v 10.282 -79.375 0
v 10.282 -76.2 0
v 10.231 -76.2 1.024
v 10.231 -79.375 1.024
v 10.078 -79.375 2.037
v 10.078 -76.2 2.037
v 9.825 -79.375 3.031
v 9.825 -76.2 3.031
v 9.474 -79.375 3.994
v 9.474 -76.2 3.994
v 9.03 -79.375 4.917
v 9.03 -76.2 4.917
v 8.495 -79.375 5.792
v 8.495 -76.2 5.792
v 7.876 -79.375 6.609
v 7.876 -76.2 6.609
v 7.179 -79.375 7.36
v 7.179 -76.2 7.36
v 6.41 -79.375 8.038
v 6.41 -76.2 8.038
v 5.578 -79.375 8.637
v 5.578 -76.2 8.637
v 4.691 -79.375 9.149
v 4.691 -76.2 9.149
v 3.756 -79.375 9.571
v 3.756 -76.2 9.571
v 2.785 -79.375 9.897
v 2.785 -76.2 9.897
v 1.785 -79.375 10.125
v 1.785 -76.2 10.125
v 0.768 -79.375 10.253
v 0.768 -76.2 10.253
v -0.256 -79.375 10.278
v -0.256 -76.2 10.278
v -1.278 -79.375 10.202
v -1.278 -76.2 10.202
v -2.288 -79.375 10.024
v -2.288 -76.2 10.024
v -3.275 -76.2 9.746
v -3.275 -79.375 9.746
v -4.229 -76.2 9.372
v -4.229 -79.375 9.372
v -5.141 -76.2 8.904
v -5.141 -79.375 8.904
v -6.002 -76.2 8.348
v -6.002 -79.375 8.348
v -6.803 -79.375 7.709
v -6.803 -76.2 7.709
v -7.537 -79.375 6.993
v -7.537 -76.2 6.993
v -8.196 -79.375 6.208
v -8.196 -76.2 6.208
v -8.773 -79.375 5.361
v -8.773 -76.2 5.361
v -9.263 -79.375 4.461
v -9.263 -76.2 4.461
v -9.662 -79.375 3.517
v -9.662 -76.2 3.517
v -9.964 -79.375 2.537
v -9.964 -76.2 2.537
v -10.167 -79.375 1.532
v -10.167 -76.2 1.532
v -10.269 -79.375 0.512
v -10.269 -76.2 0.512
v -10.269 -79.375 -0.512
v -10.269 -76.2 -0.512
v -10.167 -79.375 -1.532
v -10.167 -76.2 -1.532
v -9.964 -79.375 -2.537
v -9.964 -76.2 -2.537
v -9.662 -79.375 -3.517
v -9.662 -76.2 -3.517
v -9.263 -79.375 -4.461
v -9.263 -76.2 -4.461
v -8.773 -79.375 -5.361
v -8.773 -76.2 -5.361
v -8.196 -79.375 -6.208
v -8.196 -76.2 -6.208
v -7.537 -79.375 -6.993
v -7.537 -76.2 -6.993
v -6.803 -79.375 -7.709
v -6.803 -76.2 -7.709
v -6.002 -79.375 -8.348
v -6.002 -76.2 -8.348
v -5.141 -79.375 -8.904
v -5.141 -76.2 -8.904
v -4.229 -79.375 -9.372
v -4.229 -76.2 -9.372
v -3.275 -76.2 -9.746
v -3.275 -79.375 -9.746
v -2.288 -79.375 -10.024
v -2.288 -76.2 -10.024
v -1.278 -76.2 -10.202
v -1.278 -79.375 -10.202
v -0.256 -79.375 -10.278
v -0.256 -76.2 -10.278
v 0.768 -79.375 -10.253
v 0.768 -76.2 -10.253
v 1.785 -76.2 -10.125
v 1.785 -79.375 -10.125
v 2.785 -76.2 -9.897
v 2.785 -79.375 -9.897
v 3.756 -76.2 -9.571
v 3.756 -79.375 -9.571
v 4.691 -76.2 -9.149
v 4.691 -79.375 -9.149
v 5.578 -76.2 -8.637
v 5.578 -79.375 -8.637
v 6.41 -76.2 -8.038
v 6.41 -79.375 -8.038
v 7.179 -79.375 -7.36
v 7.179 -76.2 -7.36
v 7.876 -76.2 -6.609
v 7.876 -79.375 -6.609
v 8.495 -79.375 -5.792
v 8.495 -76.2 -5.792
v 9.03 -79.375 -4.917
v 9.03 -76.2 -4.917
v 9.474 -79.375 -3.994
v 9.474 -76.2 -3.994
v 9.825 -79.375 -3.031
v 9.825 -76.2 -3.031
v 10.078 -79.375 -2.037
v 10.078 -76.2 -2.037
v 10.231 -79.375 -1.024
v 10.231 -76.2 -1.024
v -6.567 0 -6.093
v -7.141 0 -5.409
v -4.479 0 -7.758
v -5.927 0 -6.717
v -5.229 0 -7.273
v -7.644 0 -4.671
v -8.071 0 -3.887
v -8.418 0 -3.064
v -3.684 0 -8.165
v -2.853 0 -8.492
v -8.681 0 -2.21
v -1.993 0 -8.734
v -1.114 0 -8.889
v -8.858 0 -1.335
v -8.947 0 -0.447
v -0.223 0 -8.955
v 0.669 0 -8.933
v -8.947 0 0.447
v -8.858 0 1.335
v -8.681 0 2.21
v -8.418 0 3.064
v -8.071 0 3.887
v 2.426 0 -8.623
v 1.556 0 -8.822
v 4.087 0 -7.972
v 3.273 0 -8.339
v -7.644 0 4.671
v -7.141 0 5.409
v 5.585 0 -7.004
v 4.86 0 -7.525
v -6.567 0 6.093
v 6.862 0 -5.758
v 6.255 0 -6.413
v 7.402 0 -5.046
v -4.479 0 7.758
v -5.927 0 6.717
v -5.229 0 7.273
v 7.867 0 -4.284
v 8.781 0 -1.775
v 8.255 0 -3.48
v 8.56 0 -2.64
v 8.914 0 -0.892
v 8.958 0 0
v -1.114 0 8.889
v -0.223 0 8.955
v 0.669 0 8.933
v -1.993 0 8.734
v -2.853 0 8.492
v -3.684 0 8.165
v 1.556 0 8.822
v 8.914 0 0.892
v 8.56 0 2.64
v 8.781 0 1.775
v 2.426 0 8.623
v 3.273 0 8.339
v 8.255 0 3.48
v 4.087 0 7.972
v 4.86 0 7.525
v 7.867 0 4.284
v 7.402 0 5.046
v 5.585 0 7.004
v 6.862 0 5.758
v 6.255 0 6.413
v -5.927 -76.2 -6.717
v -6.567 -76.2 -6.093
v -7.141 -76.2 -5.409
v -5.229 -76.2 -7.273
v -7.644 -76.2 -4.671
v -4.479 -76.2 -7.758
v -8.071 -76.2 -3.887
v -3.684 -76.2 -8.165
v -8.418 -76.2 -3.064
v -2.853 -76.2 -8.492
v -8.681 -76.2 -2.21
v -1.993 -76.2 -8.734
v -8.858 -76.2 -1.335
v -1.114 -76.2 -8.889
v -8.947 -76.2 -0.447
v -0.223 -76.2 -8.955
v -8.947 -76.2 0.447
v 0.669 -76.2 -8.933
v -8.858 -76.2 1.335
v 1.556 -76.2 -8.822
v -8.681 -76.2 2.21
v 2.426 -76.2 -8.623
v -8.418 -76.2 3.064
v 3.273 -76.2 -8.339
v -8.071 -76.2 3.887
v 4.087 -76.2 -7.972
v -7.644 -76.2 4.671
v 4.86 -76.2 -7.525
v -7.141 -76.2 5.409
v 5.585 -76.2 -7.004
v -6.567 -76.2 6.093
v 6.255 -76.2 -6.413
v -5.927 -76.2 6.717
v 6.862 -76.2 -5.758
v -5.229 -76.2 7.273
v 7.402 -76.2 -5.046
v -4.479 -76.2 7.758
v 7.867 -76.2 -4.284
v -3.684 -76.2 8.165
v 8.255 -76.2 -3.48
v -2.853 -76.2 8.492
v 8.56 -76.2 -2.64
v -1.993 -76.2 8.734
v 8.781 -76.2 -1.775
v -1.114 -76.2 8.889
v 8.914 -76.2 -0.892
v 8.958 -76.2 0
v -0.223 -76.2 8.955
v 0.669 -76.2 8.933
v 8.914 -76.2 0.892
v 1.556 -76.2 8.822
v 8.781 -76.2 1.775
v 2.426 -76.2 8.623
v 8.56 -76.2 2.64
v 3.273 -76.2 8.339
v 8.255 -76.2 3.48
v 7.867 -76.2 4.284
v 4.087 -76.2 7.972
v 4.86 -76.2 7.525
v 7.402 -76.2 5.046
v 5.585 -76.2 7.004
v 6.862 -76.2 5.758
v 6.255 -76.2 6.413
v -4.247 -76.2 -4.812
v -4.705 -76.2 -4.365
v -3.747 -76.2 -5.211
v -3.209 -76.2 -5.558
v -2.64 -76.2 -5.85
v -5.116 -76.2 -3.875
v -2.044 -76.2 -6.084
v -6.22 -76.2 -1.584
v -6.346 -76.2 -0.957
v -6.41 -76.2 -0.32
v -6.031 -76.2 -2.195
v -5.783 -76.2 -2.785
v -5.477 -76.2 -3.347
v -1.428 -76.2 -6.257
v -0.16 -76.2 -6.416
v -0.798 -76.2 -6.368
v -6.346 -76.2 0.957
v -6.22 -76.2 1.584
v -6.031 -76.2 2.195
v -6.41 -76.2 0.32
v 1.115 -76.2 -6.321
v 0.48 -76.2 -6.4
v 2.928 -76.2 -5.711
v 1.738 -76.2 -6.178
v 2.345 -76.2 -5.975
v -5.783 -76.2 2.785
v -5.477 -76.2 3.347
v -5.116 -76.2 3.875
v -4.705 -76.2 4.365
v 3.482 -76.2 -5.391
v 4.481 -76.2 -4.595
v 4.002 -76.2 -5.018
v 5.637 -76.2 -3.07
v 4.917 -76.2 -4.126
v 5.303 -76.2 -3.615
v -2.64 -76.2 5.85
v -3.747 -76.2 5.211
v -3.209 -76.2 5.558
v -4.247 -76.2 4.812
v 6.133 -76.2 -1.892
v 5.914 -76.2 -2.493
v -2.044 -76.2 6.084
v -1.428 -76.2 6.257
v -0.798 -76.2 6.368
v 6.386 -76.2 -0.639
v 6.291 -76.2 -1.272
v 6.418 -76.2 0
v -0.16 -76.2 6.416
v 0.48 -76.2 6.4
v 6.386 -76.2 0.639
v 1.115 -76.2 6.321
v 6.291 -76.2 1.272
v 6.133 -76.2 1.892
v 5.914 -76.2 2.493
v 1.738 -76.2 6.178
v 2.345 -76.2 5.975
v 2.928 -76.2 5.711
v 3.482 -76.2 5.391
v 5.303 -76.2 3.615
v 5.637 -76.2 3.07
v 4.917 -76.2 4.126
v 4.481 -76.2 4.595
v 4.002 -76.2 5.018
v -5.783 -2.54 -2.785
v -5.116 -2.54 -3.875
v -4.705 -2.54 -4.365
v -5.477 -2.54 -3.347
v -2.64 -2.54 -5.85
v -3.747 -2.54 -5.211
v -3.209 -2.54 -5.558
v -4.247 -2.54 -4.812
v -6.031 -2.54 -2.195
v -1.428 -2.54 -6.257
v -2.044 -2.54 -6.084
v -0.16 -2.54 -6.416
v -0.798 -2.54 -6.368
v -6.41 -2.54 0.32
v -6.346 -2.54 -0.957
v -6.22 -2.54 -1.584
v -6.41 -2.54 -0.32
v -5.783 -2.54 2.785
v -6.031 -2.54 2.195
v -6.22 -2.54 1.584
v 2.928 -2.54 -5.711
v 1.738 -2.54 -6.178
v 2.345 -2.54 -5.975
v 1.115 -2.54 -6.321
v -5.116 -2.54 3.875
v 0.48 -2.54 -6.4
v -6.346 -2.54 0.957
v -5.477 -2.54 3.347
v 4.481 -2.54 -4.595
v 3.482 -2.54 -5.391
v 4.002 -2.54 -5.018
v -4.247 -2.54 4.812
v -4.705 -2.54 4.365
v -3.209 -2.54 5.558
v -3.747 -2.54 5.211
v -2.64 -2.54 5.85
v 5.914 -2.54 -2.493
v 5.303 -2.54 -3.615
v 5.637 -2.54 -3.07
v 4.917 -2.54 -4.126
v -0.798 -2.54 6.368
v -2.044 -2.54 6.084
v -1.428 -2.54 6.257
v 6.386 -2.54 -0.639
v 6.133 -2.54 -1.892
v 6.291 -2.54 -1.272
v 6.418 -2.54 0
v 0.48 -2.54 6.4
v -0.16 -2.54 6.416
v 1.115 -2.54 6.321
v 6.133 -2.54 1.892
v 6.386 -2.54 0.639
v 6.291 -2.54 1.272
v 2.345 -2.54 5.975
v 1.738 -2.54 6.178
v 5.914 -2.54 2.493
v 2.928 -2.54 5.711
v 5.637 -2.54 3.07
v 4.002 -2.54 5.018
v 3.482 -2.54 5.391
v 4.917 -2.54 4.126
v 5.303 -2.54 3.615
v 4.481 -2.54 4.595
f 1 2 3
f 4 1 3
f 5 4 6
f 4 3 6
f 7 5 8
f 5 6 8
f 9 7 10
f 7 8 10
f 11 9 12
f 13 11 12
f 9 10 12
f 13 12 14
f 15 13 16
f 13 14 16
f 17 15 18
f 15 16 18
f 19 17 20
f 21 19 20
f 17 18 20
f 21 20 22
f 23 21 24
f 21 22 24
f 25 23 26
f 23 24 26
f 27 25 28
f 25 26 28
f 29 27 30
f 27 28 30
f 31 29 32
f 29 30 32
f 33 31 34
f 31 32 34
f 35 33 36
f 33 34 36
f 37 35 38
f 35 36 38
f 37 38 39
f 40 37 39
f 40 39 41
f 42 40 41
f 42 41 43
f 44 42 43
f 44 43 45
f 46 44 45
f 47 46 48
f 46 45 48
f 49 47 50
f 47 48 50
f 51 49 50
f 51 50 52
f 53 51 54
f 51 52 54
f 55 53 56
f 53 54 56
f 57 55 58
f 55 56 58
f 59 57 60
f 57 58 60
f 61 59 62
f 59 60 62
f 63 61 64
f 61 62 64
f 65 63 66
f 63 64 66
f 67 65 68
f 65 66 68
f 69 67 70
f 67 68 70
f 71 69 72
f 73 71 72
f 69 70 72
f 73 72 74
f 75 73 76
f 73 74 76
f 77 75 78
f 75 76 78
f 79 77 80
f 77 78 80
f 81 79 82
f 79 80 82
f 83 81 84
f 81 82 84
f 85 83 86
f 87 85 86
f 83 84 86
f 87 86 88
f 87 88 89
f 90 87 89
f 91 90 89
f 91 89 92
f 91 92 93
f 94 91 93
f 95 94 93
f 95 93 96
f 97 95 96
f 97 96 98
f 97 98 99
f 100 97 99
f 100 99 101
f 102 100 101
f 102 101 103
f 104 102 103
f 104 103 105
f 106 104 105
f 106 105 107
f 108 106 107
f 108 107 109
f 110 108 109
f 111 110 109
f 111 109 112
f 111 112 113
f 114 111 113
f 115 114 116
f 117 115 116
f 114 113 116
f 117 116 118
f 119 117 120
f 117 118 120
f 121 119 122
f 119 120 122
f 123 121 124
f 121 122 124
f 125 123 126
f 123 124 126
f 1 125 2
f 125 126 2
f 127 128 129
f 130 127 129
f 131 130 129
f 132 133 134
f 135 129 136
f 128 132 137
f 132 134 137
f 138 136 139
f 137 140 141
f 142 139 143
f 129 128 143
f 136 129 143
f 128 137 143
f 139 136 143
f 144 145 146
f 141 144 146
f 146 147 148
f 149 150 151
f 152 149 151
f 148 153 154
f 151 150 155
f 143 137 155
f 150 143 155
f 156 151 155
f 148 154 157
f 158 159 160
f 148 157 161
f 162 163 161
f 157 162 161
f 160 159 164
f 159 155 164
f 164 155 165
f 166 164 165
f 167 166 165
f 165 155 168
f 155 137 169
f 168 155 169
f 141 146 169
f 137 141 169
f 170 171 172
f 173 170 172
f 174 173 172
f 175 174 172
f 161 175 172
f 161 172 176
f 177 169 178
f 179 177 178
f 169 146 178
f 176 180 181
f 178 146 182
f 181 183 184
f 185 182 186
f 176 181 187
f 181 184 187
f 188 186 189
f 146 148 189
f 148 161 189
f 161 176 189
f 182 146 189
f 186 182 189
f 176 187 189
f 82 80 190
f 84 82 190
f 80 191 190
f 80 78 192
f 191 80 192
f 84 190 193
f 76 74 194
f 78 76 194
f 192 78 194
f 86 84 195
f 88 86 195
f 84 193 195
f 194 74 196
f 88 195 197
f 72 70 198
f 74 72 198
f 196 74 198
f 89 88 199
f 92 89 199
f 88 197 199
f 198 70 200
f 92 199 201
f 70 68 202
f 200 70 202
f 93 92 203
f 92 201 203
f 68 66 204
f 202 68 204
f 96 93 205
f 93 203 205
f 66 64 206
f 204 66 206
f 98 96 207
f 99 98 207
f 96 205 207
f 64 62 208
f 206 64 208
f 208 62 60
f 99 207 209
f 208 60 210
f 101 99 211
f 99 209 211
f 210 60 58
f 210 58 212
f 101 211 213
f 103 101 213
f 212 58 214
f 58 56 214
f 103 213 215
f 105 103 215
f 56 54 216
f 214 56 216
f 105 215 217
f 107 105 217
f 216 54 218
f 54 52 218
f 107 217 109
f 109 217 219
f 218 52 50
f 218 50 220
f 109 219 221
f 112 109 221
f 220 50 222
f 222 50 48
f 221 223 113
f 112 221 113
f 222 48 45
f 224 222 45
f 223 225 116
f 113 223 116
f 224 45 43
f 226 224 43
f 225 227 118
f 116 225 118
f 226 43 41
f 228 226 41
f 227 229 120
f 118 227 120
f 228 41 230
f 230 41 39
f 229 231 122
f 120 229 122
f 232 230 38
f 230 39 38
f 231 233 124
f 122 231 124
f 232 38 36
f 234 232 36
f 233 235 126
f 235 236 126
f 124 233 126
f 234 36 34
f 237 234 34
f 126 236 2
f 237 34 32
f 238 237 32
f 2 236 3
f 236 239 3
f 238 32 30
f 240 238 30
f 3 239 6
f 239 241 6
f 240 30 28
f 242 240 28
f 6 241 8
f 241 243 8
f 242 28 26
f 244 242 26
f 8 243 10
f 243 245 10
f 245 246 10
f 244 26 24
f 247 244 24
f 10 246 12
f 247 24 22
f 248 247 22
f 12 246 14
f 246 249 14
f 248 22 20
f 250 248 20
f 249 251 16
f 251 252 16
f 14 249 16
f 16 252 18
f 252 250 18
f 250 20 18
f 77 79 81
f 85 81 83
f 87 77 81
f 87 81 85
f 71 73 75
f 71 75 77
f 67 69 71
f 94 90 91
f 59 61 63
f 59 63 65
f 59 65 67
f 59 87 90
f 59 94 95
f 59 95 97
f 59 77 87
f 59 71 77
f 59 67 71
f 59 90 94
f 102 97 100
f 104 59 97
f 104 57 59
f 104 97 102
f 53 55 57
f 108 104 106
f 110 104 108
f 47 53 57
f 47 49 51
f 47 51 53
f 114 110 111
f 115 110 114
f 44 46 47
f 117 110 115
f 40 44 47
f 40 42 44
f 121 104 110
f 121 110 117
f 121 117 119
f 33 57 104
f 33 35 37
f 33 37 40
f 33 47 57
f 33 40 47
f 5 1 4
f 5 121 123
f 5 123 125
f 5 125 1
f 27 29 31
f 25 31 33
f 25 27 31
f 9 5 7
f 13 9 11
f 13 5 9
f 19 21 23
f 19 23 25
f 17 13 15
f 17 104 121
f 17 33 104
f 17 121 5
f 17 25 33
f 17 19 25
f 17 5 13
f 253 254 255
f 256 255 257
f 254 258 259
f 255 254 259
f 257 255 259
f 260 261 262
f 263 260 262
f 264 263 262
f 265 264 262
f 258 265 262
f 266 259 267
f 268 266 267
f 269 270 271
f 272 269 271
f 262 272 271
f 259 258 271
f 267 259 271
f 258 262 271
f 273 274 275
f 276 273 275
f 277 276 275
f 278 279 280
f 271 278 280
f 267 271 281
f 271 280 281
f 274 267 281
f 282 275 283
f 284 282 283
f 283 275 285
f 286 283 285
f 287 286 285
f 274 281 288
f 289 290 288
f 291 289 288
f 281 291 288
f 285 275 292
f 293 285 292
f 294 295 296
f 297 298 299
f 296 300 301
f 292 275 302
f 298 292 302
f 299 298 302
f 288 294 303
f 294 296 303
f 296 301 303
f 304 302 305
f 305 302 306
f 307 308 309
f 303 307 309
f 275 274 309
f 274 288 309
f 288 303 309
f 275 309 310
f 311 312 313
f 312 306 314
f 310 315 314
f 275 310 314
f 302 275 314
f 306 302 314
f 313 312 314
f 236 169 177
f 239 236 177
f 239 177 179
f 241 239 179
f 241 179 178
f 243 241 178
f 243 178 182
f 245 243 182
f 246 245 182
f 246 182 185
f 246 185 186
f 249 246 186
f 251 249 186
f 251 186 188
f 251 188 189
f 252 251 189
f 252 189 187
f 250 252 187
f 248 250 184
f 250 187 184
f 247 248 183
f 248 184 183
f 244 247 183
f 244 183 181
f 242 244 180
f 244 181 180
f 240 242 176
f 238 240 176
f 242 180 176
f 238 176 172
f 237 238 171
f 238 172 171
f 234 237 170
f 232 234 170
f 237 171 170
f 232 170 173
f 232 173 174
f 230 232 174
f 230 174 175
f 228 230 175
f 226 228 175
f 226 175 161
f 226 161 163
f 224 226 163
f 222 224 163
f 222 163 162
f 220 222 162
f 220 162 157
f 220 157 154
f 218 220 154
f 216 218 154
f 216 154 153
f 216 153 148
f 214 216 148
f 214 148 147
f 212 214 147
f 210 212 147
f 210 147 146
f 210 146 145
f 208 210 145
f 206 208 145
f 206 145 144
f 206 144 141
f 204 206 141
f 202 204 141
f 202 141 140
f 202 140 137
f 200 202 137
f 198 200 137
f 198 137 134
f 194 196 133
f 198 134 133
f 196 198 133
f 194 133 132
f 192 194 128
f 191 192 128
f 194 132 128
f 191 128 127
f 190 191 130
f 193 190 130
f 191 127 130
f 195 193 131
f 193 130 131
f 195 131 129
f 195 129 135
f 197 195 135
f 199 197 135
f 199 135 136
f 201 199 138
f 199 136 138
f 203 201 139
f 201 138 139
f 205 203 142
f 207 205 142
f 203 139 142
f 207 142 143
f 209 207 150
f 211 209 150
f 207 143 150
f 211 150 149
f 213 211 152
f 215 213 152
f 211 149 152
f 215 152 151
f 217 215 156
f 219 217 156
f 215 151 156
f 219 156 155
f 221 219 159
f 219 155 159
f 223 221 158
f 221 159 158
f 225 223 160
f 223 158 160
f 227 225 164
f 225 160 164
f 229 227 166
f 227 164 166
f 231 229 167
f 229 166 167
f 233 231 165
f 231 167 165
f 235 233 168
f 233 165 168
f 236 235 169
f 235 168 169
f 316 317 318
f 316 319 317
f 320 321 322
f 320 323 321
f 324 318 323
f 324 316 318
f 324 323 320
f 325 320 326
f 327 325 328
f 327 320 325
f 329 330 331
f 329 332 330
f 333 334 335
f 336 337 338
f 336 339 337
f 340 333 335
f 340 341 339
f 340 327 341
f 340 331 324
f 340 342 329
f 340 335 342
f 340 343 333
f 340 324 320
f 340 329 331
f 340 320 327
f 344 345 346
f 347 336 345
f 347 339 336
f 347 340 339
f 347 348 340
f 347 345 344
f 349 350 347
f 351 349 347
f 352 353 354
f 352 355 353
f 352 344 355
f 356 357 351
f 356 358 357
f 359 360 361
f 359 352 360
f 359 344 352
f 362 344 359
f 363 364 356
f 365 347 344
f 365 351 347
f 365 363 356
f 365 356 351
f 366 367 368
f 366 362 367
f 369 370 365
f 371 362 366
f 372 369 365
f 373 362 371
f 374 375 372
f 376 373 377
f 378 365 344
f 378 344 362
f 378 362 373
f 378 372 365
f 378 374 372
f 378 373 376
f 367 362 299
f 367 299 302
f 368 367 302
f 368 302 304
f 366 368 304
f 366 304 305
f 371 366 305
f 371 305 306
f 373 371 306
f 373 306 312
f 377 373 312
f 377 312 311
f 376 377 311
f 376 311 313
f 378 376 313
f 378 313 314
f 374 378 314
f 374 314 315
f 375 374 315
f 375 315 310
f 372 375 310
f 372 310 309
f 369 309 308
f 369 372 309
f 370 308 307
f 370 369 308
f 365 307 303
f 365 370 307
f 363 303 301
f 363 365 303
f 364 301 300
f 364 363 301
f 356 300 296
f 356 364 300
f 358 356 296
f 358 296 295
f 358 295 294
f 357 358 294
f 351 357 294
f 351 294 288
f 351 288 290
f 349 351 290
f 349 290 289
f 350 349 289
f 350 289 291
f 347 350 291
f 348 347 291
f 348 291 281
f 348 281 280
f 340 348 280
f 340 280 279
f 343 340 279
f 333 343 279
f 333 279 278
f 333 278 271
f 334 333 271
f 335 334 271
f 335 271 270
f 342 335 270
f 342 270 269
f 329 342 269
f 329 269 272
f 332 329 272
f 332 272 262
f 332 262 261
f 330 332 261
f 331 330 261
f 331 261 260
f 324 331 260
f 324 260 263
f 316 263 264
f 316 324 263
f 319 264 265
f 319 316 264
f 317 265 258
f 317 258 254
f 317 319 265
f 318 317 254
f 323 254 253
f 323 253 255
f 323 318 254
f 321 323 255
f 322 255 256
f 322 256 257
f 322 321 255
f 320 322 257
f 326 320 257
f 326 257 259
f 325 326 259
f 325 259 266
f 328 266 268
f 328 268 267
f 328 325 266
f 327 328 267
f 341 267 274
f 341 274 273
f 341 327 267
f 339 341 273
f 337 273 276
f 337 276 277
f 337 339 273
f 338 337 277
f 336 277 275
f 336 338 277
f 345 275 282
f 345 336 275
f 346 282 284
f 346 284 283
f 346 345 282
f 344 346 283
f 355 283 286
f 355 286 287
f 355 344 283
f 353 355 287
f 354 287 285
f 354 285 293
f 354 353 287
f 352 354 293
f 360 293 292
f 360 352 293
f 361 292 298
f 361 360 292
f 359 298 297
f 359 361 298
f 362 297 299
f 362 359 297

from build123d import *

# Parameters (mm, degrees)
F0_R     = 8.95817
F1_DEPTH = 13.716
F2_DEPTH = 76.2
F3_T     = -2.54
F4_R     = 10.281623
F5_DEPTH = 3.175


with BuildPart() as f1:
    # F0 (on Front) → F1 (new body)
    with BuildSketch(Plane.XZ):
        Circle(F0_R)
    extrude(amount=F1_DEPTH)

    # F0 (on Front) → F2 (join)
    with BuildSketch(Plane.XZ):
        Circle(F0_R)
    extrude(amount=F2_DEPTH)

    # F3
    f3_openings = [f1.faces().sort_by_distance(p)[0] for p in [
        (0, -76.2, 0),
    ]]
    offset(amount=F3_T, openings=f3_openings)

    # F4 (on face) → F5 (join)
    with BuildSketch(Plane.XZ.offset(76.2)):
        Circle(F4_R)
    extrude(amount=F5_DEPTH)


solid = f1.part
